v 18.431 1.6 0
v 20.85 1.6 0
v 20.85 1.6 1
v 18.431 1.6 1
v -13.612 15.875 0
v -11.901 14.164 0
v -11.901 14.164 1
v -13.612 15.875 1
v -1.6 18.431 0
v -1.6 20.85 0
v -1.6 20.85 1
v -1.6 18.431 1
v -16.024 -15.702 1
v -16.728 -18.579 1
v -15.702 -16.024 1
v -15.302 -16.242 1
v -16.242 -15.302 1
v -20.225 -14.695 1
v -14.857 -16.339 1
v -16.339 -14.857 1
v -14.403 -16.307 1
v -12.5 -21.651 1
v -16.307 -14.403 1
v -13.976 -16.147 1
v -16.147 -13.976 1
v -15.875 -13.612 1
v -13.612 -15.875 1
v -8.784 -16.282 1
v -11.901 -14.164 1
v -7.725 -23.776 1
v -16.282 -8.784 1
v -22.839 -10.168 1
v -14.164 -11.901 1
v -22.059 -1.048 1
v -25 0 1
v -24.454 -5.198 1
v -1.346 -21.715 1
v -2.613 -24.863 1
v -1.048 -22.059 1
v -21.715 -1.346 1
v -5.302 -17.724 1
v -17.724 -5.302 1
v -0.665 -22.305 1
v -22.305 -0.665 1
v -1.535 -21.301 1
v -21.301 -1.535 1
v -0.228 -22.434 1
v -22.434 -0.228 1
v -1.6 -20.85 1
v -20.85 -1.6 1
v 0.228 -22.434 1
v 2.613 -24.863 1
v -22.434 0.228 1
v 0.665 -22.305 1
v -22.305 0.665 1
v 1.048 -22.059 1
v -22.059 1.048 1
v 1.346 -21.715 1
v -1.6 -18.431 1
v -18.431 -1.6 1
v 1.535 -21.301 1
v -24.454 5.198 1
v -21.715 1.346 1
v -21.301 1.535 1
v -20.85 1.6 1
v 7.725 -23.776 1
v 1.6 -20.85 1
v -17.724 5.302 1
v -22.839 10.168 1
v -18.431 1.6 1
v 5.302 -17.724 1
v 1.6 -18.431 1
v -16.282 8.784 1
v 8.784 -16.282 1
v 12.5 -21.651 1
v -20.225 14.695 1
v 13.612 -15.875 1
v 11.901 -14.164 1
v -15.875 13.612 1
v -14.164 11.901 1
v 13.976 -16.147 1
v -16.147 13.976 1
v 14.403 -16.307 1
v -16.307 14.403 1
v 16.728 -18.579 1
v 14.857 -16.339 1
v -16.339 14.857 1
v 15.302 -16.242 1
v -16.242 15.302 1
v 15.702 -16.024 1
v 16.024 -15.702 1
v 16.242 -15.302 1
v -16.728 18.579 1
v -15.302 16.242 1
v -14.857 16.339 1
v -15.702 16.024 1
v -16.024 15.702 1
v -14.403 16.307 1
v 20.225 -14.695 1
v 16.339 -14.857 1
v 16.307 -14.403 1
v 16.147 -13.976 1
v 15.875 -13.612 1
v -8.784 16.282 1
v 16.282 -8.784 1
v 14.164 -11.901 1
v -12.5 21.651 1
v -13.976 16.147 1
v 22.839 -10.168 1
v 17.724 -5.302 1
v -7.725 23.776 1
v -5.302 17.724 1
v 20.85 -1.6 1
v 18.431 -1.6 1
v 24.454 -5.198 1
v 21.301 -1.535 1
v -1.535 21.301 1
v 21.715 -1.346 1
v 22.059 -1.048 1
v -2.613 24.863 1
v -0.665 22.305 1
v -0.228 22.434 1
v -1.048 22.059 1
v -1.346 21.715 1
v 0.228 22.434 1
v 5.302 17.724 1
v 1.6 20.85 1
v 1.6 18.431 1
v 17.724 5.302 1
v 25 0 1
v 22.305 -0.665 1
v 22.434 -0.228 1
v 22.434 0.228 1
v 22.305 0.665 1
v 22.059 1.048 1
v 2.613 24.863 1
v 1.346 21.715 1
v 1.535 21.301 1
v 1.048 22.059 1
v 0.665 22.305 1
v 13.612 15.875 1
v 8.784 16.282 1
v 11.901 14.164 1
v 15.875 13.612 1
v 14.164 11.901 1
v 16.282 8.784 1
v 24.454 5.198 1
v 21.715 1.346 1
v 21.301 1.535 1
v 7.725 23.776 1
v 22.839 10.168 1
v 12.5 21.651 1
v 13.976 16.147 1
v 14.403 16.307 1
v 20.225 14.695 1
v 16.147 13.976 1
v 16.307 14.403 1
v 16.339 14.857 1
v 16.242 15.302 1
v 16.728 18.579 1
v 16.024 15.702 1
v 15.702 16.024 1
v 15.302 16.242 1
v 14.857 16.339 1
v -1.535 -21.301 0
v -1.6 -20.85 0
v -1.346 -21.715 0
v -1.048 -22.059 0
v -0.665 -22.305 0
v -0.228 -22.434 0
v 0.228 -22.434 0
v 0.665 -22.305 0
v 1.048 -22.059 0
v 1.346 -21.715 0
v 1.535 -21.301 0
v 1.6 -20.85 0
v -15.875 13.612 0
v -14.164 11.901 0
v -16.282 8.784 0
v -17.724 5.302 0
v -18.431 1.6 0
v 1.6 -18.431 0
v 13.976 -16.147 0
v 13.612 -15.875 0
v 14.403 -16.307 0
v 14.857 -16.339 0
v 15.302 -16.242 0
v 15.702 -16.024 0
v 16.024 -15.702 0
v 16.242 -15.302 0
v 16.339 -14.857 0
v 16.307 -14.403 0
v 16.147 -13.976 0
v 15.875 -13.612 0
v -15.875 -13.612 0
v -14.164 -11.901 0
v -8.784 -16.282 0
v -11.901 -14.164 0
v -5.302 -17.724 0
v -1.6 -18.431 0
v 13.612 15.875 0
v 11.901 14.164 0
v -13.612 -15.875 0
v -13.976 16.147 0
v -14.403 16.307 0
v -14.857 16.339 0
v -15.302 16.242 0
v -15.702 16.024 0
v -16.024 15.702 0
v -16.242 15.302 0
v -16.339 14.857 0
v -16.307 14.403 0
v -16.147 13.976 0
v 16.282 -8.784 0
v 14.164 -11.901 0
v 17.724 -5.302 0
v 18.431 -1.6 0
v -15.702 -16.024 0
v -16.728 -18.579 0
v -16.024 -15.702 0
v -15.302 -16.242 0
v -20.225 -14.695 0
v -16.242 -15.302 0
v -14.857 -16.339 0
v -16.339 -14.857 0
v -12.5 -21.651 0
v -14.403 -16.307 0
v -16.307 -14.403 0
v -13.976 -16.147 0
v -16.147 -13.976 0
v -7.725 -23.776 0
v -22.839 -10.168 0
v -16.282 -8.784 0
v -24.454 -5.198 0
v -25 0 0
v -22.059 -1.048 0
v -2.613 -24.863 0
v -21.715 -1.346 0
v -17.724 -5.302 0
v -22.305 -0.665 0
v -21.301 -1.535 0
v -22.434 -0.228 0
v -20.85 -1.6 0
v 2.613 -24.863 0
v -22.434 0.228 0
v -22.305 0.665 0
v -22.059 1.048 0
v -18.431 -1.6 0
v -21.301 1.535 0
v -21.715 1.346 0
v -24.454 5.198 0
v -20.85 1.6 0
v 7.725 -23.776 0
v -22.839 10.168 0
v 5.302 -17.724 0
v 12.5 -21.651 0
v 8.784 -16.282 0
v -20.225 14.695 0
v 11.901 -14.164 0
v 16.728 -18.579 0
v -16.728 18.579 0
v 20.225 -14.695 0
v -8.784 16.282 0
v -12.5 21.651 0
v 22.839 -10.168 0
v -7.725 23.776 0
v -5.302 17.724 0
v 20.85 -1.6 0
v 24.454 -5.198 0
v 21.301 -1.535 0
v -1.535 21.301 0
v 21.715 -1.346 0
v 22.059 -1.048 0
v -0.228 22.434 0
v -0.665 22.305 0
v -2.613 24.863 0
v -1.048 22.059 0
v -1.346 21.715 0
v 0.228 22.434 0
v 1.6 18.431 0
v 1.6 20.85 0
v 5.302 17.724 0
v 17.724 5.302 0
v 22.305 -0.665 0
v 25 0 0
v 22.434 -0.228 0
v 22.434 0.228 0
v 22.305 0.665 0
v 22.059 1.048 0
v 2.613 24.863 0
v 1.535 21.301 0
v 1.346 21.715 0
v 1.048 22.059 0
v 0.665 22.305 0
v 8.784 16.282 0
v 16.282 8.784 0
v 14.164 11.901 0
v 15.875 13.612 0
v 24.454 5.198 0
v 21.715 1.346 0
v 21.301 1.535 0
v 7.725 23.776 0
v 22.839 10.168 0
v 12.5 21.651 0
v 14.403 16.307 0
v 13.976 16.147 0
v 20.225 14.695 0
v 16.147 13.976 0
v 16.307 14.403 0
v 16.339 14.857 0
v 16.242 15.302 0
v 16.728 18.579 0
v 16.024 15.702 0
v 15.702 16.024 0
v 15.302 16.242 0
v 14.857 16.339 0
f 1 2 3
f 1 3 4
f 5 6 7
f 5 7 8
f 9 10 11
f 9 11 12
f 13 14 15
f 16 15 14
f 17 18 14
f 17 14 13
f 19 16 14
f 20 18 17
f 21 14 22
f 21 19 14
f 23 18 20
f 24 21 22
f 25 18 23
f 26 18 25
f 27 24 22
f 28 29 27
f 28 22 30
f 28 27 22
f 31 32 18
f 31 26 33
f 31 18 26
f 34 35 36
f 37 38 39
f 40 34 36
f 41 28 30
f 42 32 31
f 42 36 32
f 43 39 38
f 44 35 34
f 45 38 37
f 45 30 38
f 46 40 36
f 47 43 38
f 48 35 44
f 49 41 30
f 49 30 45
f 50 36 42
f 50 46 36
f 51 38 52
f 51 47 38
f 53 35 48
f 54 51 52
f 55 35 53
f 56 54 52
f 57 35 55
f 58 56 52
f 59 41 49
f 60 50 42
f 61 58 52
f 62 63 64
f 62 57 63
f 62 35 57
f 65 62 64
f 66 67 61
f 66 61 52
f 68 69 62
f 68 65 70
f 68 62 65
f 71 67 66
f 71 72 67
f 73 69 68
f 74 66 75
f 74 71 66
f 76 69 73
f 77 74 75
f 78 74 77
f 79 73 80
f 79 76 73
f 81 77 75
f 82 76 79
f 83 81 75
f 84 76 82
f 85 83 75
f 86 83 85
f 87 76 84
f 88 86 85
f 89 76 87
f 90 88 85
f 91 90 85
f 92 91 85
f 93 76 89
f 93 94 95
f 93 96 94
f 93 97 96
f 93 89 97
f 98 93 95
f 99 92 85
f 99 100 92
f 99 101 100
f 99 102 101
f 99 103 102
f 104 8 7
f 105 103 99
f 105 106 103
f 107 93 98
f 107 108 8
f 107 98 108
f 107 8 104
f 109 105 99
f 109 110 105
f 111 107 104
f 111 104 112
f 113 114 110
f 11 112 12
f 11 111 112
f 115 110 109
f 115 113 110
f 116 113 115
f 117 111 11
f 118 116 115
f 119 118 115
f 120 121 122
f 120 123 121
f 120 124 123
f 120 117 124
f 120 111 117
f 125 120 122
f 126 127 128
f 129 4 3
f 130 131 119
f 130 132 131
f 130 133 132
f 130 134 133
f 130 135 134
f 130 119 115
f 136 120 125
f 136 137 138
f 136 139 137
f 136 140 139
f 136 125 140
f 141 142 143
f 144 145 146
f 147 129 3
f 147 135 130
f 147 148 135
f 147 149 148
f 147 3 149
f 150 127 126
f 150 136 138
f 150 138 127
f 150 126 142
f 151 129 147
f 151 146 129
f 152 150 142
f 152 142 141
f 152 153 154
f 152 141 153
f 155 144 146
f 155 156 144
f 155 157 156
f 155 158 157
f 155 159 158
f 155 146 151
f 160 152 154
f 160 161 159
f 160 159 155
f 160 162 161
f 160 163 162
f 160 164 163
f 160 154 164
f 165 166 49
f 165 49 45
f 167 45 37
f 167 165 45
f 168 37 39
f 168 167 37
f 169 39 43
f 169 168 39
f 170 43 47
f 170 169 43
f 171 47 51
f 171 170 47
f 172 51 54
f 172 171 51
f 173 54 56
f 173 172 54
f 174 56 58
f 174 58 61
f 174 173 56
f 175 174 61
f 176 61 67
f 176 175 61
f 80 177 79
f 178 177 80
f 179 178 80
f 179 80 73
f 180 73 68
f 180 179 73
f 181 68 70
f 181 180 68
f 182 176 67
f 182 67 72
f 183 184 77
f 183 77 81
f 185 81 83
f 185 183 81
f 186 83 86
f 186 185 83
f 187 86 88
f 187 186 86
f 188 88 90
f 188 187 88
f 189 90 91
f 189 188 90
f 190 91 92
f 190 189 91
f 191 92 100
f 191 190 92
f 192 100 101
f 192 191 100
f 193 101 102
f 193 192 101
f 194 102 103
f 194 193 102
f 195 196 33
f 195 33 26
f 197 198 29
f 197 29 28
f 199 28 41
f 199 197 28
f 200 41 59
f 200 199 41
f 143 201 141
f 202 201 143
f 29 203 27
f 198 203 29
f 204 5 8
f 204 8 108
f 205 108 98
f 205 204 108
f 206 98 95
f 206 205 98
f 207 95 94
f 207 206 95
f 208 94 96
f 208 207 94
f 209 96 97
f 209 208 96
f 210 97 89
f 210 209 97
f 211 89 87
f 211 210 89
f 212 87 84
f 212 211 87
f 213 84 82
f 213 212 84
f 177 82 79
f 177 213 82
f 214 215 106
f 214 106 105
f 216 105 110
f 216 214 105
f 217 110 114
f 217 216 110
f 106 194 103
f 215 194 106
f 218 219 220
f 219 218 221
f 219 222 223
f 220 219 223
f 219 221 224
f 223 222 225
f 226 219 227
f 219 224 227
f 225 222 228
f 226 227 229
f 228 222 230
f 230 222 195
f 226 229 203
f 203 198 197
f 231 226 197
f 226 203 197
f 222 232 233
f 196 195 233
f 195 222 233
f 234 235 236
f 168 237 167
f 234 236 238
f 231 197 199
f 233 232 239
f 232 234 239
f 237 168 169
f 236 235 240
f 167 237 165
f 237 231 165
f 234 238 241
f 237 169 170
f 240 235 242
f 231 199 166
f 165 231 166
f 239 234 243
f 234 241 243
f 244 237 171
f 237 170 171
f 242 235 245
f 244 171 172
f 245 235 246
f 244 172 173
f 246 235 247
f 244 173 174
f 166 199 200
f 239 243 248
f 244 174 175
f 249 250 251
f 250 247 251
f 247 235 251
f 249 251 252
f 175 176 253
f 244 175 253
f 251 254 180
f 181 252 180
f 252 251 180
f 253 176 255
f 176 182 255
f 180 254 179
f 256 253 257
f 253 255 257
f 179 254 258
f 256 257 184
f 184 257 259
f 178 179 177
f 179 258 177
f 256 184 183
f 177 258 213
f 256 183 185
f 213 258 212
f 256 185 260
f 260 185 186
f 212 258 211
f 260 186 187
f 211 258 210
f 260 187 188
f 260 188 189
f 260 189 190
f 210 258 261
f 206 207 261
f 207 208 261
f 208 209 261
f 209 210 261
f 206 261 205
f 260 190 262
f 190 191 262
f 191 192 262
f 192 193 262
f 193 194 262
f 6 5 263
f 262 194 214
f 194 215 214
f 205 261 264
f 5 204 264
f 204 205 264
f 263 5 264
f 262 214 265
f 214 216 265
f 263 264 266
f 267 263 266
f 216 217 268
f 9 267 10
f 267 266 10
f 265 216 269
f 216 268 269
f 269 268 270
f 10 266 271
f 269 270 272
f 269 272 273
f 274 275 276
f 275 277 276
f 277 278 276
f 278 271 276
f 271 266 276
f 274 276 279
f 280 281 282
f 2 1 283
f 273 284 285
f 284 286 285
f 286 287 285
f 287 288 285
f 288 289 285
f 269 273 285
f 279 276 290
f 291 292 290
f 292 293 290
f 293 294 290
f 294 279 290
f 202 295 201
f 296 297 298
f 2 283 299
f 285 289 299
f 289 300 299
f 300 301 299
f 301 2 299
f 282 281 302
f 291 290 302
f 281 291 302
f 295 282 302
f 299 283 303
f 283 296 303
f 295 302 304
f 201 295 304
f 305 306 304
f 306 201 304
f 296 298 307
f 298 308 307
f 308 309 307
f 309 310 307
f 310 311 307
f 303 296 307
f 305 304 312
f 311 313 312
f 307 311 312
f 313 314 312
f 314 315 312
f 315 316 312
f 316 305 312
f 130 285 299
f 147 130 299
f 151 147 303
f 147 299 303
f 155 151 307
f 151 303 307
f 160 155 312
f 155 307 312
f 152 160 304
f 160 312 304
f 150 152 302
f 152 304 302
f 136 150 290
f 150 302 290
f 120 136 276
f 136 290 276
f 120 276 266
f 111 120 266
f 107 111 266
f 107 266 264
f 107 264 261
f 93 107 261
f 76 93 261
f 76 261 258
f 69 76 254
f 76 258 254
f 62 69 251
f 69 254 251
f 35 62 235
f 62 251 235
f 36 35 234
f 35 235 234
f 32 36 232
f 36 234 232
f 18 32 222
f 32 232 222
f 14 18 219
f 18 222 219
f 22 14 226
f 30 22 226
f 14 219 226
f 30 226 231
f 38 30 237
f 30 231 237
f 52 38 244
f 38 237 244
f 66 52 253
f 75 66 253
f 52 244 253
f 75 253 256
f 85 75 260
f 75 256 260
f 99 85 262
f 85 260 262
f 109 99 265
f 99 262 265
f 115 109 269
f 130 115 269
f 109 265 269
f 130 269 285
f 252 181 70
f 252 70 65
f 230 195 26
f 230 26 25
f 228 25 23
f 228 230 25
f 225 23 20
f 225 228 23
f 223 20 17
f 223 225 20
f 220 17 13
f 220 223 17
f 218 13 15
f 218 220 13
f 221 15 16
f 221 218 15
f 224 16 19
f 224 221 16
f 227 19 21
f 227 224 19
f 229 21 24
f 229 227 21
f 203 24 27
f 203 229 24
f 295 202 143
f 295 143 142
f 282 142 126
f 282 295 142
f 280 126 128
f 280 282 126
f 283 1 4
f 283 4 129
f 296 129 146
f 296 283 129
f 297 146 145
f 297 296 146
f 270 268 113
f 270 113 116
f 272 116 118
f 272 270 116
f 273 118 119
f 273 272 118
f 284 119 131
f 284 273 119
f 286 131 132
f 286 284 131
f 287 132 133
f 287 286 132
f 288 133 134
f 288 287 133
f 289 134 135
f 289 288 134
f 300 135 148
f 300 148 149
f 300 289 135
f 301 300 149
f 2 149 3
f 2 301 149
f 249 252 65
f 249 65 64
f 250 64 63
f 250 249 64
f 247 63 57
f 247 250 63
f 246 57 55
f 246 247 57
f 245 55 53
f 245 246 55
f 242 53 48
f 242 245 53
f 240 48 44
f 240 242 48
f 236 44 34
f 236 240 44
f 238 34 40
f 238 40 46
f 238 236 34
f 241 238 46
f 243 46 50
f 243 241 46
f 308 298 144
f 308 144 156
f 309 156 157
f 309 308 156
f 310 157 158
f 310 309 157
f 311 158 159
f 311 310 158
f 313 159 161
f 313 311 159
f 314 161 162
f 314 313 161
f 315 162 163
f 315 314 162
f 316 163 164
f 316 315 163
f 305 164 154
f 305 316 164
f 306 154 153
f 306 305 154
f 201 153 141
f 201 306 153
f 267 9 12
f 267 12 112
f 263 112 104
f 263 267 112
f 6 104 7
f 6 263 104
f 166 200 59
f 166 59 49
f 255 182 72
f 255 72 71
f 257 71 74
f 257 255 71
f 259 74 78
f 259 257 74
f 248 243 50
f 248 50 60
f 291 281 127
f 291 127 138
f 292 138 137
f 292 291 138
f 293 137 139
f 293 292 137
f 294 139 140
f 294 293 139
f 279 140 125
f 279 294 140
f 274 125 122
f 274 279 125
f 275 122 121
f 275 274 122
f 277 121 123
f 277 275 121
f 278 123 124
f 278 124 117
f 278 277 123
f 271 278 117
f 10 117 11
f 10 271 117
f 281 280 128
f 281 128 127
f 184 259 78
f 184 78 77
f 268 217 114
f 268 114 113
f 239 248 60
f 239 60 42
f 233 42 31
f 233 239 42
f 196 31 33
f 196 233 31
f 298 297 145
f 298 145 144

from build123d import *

# Parameters (mm, degrees)
SKETCH_1_R      = 25
EXTRUDE_1_DEPTH = 1


with BuildPart() as part:
    # 草图1 → 凸台-拉伸1 (new body)
    with BuildSketch(Plane.XY):
        Circle(SKETCH_1_R)
        with BuildLine():
            Line((-1.6, 20.85), (-1.6, 18.430680942))
            ThreePointArc((-1.6, 18.430680942), (-7.079643499, 17.091771351), (-11.901088626, 14.163830326))
            Line((-11.901088626, 14.163830326), (-13.611805538, 15.874547238))
            ThreePointArc((-13.611805538, 15.874547238), (-15.874547238, 15.874547238), (-15.874547238, 13.611805538))
            Line((-15.874547238, 13.611805538), (-14.163830326, 11.901088626))
            ThreePointArc((-14.163830326, 11.901088626), (-17.091771351, 7.079643499), (-18.430680942, 1.6))
            Line((-18.430680942, 1.6), (-20.85, 1.6))
            ThreePointArc((-20.85, 1.6), (-22.45, 0), (-20.85, -1.6))
            Line((-20.85, -1.6), (-18.430680942, -1.6))
            ThreePointArc((-18.430680942, -1.6), (-17.091771351, -7.079643499), (-14.163830326, -11.901088626))
            Line((-14.163830326, -11.901088626), (-15.874547238, -13.611805538))
            ThreePointArc((-15.874547238, -13.611805538), (-15.874547238, -15.874547238), (-13.611805538, -15.874547238))
            Line((-13.611805538, -15.874547238), (-11.901088626, -14.163830326))
            ThreePointArc((-11.901088626, -14.163830326), (-7.079643499, -17.091771351), (-1.6, -18.430680942))
            Line((-1.6, -18.430680942), (-1.6, -20.85))
            ThreePointArc((-1.6, -20.85), (0, -22.45), (1.6, -20.85))
            Line((1.6, -20.85), (1.6, -18.430680942))
            ThreePointArc((1.6, -18.430680942), (7.079643499, -17.091771351), (11.901088626, -14.163830326))
            Line((11.901088626, -14.163830326), (13.611805538, -15.874547238))
            ThreePointArc((13.611805538, -15.874547238), (15.874547238, -15.874547238), (15.874547238, -13.611805538))
            Line((15.874547238, -13.611805538), (14.163830326, -11.901088626))
            ThreePointArc((14.163830326, -11.901088626), (17.091771351, -7.079643499), (18.430680942, -1.6))
            Line((18.430680942, -1.6), (20.85, -1.6))
            ThreePointArc((20.85, -1.6), (22.45, 0), (20.85, 1.6))
            Line((20.85, 1.6), (18.430680942, 1.6))
            ThreePointArc((18.430680942, 1.6), (17.091771351, 7.079643499), (14.163830326, 11.901088626))
            Line((14.163830326, 11.901088626), (15.874547238, 13.611805538))
            ThreePointArc((15.874547238, 13.611805538), (15.874547238, 15.874547238), (13.611805538, 15.874547238))
            Line((13.611805538, 15.874547238), (11.901088626, 14.163830326))
            ThreePointArc((11.901088626, 14.163830326), (7.079643499, 17.091771351), (1.6, 18.430680942))
            Line((1.6, 18.430680942), (1.6, 20.85))
            ThreePointArc((1.6, 20.85), (0, 22.45), (-1.6, 20.85))
        make_face(mode=Mode.SUBTRACT)
    extrude(amount=EXTRUDE_1_DEPTH)


solid = part.part
